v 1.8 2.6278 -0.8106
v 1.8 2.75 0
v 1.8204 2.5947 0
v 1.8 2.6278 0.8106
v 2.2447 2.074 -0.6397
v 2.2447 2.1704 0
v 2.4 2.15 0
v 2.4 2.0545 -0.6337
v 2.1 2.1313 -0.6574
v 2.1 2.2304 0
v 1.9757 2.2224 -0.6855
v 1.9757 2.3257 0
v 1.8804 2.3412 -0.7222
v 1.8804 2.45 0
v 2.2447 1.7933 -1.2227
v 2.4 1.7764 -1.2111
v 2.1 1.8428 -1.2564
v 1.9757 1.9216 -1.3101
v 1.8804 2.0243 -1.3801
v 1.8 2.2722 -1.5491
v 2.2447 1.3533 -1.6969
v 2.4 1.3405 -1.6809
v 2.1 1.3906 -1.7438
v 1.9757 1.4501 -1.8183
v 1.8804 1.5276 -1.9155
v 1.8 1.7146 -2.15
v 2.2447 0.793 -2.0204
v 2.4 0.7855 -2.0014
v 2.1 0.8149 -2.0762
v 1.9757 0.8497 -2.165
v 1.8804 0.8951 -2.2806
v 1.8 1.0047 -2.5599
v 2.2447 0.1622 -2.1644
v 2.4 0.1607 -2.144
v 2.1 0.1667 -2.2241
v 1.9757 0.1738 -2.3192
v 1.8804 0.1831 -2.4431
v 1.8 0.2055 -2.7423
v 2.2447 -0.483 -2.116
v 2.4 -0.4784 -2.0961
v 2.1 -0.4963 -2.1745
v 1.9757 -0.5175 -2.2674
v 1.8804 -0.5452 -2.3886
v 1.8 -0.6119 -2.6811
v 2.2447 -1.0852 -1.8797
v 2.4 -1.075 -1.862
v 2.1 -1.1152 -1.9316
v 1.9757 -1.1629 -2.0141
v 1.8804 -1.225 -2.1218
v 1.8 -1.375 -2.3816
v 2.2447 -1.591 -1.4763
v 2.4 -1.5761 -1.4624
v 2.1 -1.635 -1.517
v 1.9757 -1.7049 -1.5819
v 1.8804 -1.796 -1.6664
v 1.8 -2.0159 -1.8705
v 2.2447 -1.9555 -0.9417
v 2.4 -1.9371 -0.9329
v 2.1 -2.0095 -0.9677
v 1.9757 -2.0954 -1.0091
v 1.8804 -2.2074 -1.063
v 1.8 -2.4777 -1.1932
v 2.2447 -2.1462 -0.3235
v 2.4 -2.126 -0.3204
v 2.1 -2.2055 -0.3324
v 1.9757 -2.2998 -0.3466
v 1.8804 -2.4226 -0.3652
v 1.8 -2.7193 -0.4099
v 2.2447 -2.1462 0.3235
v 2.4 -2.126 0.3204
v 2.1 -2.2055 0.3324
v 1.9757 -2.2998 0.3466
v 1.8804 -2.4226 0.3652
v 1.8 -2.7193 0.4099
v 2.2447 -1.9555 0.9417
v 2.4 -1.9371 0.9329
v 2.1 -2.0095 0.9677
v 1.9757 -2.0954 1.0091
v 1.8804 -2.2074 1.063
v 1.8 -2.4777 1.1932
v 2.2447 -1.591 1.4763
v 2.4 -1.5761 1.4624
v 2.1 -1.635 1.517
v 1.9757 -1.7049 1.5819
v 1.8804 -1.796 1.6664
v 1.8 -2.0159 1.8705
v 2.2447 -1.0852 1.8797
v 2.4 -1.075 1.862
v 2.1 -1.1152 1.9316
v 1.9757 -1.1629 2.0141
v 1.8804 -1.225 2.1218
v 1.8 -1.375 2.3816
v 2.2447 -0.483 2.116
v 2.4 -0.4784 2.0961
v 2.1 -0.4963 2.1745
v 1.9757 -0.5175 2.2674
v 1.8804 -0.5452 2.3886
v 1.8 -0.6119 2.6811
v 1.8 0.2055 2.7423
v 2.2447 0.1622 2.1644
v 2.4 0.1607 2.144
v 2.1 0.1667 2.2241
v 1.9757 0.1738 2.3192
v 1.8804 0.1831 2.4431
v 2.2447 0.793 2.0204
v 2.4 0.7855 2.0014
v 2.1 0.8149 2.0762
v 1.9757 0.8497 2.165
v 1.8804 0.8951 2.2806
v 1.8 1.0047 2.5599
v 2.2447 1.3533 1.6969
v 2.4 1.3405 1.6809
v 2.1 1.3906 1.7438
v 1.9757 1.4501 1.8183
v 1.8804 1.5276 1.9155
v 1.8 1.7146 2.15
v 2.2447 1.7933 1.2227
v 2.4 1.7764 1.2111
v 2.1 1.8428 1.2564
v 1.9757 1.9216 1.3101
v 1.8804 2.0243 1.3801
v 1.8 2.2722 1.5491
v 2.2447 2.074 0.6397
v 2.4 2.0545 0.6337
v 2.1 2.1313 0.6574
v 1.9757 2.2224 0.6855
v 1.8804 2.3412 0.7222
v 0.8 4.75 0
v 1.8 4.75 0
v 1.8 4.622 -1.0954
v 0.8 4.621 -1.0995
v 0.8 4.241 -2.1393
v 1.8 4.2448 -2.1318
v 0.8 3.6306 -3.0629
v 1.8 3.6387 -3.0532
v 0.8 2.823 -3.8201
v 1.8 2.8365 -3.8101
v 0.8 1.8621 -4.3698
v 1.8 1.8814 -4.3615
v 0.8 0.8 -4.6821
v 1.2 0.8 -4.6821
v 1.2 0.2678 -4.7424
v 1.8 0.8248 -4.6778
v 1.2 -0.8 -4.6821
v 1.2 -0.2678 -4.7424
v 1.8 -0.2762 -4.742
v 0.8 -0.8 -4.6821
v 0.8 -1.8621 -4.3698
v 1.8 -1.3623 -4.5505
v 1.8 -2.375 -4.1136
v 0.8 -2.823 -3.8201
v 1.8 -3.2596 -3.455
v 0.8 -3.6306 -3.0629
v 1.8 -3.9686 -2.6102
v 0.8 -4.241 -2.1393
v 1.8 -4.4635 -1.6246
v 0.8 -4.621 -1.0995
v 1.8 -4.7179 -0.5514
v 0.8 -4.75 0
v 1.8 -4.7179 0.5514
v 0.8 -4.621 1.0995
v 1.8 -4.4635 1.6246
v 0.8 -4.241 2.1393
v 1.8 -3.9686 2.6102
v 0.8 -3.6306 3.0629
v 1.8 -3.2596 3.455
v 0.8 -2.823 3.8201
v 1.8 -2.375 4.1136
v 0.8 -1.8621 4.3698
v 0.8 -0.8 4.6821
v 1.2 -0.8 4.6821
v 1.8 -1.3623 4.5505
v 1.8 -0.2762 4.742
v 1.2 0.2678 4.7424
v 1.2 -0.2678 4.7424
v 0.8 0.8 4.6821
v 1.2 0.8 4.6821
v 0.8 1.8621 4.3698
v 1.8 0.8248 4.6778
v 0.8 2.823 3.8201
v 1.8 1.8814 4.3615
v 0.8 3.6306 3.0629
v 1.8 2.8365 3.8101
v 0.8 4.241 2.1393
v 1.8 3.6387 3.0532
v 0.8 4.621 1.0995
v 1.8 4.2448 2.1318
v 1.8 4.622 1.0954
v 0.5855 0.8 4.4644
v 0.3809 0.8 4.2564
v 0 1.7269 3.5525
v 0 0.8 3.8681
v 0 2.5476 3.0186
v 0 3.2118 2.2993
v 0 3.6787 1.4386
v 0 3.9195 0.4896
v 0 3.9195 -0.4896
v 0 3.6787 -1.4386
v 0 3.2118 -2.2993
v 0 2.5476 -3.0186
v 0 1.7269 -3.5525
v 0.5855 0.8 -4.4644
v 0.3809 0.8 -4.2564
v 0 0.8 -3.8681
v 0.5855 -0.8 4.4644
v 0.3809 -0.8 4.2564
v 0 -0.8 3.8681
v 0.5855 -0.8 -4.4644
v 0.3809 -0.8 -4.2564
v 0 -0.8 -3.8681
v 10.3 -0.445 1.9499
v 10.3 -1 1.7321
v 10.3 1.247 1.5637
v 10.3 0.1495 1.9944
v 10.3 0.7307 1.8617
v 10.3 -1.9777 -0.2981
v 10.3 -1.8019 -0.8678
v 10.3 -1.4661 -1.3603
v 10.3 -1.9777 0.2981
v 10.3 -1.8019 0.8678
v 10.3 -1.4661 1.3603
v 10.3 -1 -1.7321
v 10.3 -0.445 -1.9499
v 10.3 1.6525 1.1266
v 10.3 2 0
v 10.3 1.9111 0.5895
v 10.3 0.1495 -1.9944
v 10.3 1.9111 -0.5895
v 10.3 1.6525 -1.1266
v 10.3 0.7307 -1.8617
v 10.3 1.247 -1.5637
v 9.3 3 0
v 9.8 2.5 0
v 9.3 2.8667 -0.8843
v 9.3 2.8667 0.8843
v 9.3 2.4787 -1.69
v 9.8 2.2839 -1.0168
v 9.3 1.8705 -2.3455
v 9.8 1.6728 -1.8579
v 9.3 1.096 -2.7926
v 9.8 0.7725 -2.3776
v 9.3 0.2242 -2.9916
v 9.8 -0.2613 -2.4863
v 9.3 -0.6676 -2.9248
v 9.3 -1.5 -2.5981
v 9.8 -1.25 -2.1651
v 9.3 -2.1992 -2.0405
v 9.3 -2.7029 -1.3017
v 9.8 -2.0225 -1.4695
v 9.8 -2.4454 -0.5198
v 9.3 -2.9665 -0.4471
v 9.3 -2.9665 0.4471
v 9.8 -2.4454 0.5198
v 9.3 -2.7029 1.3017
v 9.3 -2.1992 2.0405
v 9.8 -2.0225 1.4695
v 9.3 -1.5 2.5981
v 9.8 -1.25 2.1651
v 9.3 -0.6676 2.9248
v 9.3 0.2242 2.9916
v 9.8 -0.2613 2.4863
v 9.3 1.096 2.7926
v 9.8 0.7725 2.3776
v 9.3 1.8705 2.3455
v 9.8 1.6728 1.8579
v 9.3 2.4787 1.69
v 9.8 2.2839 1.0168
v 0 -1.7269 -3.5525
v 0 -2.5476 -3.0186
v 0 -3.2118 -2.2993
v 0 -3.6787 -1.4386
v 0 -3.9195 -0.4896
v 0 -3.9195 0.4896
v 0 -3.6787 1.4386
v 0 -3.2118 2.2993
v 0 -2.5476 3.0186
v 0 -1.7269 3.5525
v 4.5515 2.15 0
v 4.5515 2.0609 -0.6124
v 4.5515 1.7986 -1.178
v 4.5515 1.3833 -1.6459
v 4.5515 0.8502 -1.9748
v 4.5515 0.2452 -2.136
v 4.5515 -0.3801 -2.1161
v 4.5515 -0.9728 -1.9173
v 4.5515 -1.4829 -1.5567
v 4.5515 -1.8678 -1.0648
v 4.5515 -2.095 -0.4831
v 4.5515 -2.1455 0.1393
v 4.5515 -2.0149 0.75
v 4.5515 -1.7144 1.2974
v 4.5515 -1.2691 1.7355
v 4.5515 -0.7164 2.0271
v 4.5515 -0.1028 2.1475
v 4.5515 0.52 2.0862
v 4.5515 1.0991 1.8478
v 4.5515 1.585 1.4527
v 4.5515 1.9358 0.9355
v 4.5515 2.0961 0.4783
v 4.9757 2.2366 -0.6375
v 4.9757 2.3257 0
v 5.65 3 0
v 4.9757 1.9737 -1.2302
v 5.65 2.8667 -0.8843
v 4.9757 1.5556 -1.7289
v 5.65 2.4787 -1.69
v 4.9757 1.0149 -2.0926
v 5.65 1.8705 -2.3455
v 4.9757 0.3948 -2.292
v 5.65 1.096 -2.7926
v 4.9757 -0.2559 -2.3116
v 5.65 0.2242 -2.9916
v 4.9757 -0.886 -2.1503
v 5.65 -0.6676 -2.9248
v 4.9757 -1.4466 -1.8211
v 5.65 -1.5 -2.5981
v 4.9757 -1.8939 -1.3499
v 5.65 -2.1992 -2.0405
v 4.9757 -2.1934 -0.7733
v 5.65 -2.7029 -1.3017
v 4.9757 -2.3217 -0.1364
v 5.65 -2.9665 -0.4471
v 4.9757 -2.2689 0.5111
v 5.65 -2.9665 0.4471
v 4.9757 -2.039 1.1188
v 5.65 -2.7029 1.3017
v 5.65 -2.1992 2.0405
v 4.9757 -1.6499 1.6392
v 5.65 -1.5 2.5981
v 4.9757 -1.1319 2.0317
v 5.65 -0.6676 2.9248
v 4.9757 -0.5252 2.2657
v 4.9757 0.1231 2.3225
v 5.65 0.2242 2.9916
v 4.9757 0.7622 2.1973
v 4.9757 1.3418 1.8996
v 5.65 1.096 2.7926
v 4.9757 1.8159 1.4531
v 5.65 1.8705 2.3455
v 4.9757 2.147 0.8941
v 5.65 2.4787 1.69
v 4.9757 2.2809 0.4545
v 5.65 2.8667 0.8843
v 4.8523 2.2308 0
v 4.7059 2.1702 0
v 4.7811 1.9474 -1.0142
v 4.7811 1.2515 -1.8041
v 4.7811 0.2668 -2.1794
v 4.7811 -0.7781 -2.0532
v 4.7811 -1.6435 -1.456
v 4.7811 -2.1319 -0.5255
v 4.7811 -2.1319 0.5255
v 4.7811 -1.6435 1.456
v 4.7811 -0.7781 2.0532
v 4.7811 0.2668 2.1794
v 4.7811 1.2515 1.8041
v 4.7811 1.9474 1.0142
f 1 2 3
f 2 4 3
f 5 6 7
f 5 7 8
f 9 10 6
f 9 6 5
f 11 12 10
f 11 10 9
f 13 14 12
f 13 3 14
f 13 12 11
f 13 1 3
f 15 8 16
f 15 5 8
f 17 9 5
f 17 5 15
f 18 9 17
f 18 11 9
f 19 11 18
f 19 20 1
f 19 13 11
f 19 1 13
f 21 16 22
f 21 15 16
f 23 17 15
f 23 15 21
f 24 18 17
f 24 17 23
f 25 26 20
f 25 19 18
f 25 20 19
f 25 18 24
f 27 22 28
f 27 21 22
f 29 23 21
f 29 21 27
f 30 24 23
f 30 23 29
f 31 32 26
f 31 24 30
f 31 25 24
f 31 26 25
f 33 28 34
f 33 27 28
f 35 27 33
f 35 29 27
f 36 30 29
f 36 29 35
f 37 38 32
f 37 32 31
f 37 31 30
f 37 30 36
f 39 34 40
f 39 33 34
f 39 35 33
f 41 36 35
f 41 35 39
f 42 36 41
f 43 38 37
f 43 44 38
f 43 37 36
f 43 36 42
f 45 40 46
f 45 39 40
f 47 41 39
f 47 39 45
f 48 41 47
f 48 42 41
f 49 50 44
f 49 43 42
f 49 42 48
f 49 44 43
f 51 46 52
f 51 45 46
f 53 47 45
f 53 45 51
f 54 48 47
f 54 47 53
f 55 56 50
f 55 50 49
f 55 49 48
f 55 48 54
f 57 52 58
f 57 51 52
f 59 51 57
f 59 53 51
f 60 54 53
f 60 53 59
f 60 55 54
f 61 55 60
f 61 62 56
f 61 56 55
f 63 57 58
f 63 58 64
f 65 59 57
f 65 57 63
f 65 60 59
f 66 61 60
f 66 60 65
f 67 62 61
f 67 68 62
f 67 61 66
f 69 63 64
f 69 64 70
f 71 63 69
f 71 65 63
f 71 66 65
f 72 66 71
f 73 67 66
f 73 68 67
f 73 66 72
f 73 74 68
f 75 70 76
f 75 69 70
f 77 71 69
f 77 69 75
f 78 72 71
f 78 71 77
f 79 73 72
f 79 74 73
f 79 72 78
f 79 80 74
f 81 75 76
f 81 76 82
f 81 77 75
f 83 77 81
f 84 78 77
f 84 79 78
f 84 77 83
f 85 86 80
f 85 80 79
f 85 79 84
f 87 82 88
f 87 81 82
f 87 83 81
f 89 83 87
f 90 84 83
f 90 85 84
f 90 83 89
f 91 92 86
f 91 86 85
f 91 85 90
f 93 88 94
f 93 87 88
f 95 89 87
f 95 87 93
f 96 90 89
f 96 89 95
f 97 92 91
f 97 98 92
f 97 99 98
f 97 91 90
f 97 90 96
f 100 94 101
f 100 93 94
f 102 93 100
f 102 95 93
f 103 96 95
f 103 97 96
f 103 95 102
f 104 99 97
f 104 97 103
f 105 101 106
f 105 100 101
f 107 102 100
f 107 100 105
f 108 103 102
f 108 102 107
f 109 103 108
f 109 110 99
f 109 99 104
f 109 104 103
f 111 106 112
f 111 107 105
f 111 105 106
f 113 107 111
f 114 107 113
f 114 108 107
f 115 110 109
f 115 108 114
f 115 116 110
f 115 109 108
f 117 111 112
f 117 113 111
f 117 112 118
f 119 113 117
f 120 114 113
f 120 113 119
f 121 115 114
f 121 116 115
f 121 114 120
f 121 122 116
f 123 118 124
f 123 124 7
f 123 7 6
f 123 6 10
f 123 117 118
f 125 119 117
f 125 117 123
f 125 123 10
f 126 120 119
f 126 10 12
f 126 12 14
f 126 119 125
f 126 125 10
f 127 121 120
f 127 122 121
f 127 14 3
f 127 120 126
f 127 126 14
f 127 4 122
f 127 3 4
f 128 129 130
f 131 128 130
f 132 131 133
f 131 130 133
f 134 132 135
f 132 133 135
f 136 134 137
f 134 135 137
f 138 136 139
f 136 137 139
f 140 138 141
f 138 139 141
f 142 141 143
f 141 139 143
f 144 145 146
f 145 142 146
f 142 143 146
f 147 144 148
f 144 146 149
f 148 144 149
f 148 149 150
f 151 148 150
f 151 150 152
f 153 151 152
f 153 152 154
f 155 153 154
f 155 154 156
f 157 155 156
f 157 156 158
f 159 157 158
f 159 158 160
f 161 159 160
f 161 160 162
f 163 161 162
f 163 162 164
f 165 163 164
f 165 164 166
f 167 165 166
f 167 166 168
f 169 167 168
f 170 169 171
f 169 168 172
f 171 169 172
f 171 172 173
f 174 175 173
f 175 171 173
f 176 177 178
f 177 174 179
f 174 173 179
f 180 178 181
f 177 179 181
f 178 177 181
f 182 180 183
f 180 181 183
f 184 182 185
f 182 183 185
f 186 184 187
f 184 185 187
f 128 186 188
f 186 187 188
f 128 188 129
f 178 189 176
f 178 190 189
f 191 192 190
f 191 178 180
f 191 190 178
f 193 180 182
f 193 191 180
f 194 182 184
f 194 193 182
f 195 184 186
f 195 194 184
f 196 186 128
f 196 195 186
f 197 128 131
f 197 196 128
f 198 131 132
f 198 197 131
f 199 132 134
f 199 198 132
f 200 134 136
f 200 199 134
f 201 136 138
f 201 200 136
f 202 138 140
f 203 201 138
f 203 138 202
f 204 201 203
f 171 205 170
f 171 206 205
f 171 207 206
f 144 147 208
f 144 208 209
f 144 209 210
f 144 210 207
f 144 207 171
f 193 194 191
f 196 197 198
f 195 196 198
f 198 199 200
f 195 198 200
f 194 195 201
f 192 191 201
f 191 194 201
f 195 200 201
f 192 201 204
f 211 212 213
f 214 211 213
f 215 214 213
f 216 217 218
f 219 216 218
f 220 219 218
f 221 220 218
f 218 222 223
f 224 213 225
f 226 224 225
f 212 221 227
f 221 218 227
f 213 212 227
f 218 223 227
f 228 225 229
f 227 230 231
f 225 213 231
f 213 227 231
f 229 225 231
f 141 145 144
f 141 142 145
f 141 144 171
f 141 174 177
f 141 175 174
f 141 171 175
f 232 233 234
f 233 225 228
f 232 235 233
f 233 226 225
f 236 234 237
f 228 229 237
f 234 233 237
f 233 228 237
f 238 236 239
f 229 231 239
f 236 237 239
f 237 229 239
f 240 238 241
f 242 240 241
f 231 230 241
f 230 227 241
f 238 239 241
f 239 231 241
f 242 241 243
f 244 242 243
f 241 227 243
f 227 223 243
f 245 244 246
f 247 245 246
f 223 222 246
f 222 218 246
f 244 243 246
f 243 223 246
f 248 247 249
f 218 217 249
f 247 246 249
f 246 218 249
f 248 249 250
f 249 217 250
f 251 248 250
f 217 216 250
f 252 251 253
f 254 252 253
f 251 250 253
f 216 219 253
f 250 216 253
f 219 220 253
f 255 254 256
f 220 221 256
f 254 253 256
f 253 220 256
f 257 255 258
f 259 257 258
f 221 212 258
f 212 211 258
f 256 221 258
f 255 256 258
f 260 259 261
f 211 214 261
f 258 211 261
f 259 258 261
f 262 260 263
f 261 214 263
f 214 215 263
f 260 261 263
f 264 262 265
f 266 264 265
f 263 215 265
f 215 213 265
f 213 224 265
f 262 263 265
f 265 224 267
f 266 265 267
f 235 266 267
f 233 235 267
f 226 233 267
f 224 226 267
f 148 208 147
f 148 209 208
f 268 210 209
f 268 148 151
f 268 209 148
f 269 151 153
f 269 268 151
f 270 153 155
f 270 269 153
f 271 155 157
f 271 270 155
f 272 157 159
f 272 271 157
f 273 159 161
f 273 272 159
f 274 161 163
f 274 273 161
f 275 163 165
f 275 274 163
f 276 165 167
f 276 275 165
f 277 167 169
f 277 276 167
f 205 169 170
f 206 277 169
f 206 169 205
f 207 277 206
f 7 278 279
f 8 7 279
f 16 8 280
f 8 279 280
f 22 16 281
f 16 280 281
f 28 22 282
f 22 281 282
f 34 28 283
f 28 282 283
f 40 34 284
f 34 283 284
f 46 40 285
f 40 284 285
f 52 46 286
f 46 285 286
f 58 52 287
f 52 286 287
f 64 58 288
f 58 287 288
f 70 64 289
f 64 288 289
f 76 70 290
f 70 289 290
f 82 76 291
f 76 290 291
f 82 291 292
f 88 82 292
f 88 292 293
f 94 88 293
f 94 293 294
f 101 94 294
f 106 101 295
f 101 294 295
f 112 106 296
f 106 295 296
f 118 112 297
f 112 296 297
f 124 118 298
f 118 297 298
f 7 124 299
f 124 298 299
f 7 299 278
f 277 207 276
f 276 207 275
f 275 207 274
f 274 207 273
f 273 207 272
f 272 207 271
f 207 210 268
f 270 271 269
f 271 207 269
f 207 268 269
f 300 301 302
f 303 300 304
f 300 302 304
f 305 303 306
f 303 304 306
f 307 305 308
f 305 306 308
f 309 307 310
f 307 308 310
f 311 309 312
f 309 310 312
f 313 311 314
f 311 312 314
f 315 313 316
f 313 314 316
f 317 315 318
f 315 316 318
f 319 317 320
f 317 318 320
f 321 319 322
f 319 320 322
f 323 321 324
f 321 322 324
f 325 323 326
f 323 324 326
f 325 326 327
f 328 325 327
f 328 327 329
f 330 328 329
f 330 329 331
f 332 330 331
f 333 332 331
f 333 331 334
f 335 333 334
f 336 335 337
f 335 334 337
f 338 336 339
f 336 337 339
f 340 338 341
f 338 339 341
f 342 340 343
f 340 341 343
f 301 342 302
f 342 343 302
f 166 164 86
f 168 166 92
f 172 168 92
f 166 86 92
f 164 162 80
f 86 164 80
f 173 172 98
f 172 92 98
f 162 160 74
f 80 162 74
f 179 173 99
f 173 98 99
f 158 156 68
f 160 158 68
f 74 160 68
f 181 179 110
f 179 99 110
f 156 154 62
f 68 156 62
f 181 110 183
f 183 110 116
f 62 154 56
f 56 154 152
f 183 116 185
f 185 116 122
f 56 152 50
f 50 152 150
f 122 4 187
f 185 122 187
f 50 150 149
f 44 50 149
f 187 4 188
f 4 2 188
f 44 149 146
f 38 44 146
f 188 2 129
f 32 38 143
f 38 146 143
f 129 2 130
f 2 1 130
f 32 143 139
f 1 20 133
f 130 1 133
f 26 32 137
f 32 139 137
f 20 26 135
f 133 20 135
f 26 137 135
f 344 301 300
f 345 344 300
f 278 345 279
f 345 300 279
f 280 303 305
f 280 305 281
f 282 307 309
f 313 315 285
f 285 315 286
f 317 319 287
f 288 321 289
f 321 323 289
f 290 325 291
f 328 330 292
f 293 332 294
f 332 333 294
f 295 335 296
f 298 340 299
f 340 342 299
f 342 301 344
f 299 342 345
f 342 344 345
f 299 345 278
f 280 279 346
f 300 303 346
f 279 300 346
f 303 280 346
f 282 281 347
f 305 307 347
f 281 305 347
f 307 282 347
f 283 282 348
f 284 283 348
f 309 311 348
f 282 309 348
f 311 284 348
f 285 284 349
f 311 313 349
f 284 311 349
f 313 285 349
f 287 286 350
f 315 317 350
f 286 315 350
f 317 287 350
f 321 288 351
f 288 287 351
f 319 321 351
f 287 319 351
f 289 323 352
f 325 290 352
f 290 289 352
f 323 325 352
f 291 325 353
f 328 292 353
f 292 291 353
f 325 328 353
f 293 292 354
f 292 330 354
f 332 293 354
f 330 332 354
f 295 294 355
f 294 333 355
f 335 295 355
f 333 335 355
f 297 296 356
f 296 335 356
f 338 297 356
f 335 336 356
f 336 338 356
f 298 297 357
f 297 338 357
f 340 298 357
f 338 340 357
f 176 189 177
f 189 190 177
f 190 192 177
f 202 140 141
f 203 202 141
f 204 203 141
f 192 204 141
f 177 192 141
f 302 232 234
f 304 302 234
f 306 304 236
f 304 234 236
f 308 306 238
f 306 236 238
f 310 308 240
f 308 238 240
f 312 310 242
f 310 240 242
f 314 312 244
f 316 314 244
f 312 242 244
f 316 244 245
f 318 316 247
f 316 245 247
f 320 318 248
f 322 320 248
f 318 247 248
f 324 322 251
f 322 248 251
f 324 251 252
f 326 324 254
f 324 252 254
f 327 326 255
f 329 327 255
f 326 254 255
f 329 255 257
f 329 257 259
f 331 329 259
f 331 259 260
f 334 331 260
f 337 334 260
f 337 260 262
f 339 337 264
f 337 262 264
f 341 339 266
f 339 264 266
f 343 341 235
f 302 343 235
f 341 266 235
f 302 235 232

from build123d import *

# Parameters (mm, degrees)
CHAMFER_1_SIZE           = 1
FILLET_1_R               = 0.6
CHAMFER_2_SIZE           = 0.8
SKETCH_2_W               = 1.2
SKETCH_2_H               = 1.6
CUT_EXTRUDE_1_DEPTH      = 5.75
CUT_EXTRUDE_1_DEPTH_BACK = 5.75


with BuildPart() as part:
    # Эскиз1 → Повернуть1 (revolve)
    with BuildSketch(Plane.XY):
        Polygon((0, 0), (0, 4.75), (1.8, 4.75), (1.8, 2.15), (4.8, 2.15), (5.65, 3), (10.3, 3), (10.3, 0), align=None)
    revolve(axis=Axis((0, 0, 0), (-1, 0, 0)))

    # Фаска1
    chamfer_1_edges = [part.edges().sort_by_distance(p)[0] for p in [
        (10.3, -3, 0),
    ]]
    chamfer(chamfer_1_edges, length=CHAMFER_1_SIZE)

    # Скругление1
    fillet_1_edges = [part.edges().sort_by_distance(p)[0] for p in [
        (4.8, -2.15, 0),
        (1.8, -2.15, 0),
    ]]
    fillet(fillet_1_edges, radius=FILLET_1_R)

    # Фаска2
    chamfer_2_edges = [part.edges().sort_by_distance(p)[0] for p in [
        (0, -4.75, 0),
    ]]
    chamfer(chamfer_2_edges, length=CHAMFER_2_SIZE)

    # Эскиз2 → Вырез-Вытянуть1 (cut, two sides)
    with BuildSketch(Plane.XY) as cut_extrude_1_sk:
        with Locations((0.6, 0)):
            Rectangle(SKETCH_2_W, SKETCH_2_H)
    extrude(amount=CUT_EXTRUDE_1_DEPTH, mode=Mode.SUBTRACT)
    extrude(cut_extrude_1_sk.sketch, amount=-CUT_EXTRUDE_1_DEPTH_BACK, mode=Mode.SUBTRACT)


solid = part.part
